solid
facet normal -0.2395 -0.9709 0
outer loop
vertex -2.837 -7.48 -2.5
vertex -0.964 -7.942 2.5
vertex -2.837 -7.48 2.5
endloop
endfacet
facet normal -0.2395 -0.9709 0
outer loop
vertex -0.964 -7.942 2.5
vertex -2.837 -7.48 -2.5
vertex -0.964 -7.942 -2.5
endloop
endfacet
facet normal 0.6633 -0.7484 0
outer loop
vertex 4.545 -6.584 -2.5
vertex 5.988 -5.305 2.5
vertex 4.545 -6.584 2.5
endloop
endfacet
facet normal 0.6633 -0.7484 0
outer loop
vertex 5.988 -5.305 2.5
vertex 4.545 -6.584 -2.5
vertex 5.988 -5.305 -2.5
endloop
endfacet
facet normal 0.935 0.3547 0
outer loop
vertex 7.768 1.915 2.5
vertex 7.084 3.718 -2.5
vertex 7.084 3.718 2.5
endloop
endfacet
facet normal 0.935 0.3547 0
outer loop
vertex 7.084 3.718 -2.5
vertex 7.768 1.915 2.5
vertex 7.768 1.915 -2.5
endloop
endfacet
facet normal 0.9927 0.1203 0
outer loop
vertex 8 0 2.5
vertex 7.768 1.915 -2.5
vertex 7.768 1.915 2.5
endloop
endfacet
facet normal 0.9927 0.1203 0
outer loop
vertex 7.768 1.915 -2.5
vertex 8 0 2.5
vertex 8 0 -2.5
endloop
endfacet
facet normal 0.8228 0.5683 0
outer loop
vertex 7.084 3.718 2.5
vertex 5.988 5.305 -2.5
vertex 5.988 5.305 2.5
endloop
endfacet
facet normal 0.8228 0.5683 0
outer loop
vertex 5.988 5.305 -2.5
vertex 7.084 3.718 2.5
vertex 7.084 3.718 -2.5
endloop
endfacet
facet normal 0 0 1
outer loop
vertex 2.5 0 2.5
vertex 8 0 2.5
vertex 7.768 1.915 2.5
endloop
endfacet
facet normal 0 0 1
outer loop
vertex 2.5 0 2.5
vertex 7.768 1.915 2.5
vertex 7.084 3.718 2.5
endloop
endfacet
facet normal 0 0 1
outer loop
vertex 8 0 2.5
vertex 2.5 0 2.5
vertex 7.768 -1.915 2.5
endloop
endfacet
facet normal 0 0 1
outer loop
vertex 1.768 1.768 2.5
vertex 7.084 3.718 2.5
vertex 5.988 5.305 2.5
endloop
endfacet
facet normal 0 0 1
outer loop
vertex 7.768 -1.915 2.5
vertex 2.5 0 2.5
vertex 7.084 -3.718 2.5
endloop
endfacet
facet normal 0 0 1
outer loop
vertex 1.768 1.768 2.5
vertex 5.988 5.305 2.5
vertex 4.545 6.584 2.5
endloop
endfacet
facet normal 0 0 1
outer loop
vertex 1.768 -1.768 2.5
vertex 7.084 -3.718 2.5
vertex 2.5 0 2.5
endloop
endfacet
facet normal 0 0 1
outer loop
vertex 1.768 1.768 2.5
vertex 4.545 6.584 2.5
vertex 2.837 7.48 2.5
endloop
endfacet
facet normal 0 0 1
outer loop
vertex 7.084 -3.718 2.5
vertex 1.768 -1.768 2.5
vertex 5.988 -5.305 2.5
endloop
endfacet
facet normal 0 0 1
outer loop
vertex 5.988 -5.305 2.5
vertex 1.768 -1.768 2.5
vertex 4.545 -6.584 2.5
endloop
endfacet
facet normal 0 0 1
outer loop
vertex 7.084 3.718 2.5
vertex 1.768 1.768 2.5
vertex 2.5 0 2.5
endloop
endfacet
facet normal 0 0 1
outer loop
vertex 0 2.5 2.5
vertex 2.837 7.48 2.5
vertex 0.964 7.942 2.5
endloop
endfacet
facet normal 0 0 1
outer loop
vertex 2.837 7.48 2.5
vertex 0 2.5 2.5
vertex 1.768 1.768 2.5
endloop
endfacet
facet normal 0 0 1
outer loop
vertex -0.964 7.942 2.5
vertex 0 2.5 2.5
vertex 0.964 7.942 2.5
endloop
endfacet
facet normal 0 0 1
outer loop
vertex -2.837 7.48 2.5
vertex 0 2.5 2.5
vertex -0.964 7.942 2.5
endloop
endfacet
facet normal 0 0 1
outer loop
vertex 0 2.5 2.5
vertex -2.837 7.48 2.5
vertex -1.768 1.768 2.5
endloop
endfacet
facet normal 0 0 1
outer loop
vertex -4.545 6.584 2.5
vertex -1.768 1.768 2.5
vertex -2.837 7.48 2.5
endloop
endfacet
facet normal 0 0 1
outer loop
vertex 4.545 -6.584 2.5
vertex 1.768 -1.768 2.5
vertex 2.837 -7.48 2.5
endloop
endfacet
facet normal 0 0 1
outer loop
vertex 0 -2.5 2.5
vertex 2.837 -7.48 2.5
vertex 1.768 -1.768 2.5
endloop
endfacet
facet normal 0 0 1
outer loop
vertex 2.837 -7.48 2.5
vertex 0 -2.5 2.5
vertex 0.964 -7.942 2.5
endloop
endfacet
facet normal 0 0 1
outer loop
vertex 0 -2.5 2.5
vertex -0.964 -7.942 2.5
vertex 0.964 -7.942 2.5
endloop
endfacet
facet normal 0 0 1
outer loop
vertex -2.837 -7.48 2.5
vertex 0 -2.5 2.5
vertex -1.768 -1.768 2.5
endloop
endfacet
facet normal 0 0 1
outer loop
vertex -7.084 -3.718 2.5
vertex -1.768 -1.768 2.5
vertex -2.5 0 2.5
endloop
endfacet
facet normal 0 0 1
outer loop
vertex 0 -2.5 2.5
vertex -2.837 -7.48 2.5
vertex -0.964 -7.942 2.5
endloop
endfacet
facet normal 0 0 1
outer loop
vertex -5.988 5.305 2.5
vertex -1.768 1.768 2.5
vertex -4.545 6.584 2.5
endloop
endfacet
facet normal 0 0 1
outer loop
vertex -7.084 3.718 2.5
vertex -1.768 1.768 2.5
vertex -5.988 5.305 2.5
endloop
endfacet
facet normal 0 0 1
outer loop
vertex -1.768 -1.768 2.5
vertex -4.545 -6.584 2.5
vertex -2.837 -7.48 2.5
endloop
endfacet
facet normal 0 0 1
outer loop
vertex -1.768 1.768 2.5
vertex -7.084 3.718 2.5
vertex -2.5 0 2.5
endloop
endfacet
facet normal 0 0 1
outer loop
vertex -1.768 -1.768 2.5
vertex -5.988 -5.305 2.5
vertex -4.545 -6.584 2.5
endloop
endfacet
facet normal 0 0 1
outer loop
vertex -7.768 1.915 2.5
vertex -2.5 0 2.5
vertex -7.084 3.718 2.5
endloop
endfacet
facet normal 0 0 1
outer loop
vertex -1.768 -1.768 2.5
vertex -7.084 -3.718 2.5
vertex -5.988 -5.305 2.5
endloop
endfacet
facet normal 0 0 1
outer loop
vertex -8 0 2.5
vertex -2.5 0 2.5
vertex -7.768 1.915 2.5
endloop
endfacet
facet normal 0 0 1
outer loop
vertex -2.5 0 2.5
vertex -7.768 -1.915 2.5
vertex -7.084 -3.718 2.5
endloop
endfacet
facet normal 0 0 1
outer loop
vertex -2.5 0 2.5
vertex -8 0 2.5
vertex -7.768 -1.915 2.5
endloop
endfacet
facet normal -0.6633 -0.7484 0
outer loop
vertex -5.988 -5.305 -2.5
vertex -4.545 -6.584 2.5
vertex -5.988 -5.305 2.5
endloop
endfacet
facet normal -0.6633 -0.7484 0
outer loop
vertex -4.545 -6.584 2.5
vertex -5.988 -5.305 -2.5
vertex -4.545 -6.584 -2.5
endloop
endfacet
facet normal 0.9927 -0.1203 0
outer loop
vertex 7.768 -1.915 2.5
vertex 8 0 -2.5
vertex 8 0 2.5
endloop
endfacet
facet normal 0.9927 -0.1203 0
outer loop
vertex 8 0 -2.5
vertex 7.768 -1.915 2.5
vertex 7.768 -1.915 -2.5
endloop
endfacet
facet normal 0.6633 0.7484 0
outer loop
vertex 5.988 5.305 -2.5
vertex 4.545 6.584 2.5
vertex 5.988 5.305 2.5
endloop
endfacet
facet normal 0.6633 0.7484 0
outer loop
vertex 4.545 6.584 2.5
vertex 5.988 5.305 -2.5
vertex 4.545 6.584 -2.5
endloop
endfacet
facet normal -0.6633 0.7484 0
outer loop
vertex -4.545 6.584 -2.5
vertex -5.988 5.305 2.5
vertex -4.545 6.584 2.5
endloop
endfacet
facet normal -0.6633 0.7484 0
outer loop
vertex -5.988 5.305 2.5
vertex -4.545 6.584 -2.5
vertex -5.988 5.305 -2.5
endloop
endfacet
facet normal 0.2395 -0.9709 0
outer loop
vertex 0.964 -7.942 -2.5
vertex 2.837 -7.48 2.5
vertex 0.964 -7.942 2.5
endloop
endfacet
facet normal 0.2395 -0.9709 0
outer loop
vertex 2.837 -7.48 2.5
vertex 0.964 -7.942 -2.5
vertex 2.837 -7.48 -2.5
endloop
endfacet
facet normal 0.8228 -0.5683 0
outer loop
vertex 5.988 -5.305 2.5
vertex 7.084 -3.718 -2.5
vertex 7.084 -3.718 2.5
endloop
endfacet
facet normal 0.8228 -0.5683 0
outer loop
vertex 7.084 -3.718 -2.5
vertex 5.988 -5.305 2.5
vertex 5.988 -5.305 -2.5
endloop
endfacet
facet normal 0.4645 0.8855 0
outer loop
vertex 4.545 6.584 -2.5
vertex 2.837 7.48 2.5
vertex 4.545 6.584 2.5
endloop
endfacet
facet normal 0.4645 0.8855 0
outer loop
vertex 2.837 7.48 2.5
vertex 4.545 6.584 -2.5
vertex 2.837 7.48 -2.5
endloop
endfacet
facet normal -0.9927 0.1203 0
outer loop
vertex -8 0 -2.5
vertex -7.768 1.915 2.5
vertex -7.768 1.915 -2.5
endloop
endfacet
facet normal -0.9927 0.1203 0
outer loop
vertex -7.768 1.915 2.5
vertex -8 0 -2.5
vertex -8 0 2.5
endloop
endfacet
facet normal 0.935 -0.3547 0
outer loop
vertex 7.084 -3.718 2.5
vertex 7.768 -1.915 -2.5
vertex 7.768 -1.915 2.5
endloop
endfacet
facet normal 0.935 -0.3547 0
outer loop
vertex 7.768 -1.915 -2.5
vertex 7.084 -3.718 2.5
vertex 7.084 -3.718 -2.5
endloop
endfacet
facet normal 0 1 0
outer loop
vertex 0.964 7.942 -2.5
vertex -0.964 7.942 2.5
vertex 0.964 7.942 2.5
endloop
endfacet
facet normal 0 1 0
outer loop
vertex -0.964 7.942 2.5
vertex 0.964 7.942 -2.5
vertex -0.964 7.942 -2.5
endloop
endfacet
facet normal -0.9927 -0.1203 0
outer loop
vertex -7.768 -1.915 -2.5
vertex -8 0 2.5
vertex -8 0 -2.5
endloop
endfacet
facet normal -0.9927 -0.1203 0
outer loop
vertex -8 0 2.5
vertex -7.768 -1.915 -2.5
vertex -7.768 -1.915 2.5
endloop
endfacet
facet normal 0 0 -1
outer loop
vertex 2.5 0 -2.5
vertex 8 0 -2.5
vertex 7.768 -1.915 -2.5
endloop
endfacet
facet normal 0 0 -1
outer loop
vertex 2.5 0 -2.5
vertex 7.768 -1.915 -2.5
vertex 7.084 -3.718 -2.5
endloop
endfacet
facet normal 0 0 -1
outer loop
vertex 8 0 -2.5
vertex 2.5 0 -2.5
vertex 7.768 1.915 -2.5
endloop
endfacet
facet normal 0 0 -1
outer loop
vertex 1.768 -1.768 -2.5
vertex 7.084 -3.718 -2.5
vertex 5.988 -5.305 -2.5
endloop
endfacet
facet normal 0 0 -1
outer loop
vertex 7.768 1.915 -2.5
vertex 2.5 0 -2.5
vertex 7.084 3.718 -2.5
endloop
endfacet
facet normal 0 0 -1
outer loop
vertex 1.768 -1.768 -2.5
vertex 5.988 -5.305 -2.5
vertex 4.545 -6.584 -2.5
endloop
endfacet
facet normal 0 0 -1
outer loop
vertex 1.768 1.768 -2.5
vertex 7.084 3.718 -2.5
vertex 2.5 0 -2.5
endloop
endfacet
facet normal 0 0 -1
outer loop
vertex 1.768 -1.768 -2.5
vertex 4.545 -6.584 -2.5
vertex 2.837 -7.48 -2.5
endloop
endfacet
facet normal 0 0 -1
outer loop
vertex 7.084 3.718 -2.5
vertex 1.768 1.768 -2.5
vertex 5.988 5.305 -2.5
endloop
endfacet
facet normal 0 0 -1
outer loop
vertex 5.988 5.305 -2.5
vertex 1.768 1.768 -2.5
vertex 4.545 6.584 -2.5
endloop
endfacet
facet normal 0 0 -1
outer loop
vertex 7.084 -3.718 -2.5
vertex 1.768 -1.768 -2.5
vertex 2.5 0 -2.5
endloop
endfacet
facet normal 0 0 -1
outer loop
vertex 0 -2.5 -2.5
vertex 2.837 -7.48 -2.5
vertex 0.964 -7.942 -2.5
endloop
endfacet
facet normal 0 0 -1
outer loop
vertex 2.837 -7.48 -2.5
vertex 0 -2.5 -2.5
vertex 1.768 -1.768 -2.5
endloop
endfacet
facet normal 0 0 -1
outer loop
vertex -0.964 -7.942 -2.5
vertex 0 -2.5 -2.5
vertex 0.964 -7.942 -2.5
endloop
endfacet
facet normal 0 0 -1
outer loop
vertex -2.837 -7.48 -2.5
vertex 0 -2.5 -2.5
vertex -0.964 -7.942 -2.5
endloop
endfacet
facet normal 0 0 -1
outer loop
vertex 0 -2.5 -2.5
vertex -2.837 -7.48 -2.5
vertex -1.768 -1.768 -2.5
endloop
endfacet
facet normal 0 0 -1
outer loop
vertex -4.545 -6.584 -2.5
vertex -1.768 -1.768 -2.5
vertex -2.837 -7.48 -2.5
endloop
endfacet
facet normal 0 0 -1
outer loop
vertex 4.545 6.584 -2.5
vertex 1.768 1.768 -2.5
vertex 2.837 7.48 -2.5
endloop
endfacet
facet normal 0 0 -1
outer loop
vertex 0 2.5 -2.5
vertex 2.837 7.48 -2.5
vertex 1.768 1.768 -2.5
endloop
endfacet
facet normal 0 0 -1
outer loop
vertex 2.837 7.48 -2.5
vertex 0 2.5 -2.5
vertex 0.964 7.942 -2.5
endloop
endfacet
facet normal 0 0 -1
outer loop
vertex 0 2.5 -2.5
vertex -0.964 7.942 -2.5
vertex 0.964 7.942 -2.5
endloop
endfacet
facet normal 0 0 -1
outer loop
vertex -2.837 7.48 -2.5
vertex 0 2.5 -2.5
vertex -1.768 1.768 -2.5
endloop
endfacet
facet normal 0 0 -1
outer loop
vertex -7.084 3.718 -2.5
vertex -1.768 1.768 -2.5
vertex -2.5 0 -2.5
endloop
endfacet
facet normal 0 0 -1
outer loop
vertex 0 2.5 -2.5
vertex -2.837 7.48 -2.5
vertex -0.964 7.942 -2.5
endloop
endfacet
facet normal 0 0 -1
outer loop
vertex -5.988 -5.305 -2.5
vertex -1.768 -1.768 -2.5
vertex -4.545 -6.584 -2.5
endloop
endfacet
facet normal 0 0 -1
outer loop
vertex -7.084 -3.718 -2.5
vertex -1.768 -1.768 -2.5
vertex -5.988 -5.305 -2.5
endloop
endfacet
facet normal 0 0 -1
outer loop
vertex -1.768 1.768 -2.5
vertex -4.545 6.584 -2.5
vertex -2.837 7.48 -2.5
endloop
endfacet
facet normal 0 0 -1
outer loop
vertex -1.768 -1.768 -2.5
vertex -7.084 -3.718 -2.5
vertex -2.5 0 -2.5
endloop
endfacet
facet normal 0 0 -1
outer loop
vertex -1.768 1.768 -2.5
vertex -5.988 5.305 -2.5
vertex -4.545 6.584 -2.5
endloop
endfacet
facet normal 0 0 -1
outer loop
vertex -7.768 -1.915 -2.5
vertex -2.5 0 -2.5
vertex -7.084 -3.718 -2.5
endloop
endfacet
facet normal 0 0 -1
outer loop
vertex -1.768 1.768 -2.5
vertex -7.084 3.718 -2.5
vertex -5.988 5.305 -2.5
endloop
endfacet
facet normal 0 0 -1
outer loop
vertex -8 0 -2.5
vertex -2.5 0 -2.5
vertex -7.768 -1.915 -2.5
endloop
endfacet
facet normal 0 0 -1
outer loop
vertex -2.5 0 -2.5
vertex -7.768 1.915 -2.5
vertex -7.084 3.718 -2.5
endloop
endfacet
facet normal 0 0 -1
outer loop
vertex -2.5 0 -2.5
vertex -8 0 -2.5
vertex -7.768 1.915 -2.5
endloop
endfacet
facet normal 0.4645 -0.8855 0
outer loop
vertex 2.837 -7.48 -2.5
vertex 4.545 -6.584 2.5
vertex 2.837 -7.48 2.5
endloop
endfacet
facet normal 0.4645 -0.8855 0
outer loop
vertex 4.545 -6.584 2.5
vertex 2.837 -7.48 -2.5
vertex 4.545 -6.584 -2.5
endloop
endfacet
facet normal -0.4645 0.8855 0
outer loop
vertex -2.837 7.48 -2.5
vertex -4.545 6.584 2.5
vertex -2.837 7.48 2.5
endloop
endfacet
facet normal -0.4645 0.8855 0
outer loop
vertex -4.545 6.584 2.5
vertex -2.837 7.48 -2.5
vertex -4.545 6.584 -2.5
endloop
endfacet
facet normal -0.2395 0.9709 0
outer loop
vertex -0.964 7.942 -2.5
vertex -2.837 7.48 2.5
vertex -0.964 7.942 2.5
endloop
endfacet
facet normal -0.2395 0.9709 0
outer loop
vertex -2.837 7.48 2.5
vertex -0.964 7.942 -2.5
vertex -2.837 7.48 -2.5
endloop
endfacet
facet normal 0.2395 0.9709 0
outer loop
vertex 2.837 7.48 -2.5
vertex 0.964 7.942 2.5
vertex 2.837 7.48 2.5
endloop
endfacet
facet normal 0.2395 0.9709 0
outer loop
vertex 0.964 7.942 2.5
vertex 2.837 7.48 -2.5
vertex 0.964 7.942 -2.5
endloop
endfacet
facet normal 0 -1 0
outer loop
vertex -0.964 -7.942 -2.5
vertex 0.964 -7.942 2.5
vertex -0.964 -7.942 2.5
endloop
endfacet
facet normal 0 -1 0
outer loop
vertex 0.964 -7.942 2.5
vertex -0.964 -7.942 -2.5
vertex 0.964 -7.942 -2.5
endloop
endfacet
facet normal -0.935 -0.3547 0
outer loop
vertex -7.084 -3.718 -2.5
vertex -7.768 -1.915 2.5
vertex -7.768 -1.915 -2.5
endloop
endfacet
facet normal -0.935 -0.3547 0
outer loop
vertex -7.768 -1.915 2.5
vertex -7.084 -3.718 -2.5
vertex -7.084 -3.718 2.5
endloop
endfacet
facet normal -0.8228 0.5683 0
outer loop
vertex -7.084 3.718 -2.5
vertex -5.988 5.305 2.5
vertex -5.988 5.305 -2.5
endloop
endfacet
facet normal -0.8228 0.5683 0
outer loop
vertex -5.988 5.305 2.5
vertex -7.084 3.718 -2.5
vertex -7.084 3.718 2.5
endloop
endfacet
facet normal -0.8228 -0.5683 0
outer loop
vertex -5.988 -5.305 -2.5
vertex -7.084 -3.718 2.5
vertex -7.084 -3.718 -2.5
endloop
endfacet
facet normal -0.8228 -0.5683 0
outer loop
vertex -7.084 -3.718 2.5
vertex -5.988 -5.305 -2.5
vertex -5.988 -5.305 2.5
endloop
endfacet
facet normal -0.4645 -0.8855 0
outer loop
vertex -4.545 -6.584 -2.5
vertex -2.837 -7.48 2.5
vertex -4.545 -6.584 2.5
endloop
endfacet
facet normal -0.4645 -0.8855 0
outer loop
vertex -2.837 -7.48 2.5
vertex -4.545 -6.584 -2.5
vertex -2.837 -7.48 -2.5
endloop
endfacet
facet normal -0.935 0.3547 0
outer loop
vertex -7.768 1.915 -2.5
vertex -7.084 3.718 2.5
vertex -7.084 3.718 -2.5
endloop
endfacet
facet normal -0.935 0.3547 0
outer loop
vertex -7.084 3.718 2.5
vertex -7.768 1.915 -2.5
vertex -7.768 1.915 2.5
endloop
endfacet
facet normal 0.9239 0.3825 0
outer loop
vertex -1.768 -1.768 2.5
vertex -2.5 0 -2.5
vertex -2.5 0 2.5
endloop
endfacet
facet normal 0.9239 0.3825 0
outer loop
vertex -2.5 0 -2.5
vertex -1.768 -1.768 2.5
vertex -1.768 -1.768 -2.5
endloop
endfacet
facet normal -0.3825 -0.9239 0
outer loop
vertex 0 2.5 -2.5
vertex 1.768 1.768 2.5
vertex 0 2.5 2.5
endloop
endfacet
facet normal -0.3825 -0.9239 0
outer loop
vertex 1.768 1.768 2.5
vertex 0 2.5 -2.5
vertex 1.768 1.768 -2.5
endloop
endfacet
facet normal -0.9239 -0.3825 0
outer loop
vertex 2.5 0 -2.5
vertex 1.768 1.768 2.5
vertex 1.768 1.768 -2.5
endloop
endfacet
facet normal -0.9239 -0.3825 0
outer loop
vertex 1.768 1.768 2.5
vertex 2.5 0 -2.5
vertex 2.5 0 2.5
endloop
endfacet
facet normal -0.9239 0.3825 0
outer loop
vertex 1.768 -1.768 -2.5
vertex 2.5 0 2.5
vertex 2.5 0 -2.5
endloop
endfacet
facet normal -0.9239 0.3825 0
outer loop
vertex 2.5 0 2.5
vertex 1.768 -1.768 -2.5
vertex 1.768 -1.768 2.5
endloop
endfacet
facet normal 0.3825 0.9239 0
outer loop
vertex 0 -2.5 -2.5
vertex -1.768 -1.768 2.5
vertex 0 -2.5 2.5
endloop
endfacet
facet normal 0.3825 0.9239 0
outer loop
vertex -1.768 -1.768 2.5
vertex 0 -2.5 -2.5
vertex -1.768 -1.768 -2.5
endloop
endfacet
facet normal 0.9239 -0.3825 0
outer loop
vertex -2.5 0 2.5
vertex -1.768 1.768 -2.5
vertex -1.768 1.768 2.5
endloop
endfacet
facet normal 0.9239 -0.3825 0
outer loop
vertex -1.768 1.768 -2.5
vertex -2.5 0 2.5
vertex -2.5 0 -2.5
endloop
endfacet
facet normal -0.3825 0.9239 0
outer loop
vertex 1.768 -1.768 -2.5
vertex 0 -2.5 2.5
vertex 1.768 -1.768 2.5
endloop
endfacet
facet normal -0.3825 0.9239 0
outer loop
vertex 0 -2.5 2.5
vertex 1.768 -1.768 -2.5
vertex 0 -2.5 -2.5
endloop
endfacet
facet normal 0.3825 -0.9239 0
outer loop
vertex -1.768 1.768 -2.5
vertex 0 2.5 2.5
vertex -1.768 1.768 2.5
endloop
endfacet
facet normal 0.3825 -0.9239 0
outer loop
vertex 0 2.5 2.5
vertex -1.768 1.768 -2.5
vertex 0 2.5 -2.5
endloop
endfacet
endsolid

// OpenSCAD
//Platzhalter für Kugellager

module kugellager625(){ //5*16*5
    difference(){
        cylinder(d=16,h=5,center=true);
        translate([0,0,-.1]) cylinder(d=5,h=5.3,center=true);
    }
}

kugellager625();
